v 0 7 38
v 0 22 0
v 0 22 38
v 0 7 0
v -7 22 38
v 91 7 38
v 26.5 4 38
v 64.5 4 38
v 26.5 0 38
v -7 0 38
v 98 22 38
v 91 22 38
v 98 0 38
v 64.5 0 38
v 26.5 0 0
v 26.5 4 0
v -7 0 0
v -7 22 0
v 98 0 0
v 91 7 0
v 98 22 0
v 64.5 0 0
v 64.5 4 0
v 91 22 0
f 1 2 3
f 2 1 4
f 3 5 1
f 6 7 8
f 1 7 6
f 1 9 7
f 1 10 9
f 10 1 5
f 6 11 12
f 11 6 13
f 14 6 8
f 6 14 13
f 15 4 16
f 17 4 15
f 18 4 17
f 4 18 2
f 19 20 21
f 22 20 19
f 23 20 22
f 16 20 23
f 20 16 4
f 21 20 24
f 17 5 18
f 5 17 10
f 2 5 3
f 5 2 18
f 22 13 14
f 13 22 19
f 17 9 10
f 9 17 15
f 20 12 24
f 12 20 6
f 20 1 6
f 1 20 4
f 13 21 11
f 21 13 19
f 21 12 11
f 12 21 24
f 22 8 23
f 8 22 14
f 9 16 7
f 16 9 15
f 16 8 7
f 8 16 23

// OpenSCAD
// The width of the wall or post that the support will be pressed against.
wall_width = 89;

// The width of the piece of the gate that will be pressed against the support.
gate_bar_diameter = 34;

// The distance from the end of the support that the inset section should be. Leave 0 for a centered inset.
inset_offset=0;

module baby_gate_support(wall_width=0, gate_bar_diameter=0, inset_offset=0) {
    support_thickness = 7;
    inset_thickness = 3;
    support_height = gate_bar_diameter + 4;
    gate_support_indent_width = gate_bar_diameter + 4;
    clip_length = 15;
    
    difference() {
        union() {
            translate([-support_thickness, 0, 0]) cube([support_thickness, clip_length + support_thickness, support_height ]);
            cube([wall_width+2, support_thickness, support_height ]);
            translate([wall_width+2, 0, 0]) cube([support_thickness, clip_length + support_thickness, support_height ]);
        }
        
        if (inset_offset == 0) {
            translate([(wall_width + 2 - gate_support_indent_width) / 2, -(support_thickness - inset_thickness), -support_height/2]) cube([gate_support_indent_width, (support_thickness - inset_thickness)*2, support_height * 2]);
        } else {
            translate([inset_offset+1, -(support_thickness - inset_thickness), -support_height/2]) cube([gate_support_indent_width, (support_thickness - inset_thickness)*2, support_height * 2]);
        }
    }
}

baby_gate_support(wall_width=wall_width, gate_bar_diameter=gate_bar_diameter, inset_offset=inset_offset);
